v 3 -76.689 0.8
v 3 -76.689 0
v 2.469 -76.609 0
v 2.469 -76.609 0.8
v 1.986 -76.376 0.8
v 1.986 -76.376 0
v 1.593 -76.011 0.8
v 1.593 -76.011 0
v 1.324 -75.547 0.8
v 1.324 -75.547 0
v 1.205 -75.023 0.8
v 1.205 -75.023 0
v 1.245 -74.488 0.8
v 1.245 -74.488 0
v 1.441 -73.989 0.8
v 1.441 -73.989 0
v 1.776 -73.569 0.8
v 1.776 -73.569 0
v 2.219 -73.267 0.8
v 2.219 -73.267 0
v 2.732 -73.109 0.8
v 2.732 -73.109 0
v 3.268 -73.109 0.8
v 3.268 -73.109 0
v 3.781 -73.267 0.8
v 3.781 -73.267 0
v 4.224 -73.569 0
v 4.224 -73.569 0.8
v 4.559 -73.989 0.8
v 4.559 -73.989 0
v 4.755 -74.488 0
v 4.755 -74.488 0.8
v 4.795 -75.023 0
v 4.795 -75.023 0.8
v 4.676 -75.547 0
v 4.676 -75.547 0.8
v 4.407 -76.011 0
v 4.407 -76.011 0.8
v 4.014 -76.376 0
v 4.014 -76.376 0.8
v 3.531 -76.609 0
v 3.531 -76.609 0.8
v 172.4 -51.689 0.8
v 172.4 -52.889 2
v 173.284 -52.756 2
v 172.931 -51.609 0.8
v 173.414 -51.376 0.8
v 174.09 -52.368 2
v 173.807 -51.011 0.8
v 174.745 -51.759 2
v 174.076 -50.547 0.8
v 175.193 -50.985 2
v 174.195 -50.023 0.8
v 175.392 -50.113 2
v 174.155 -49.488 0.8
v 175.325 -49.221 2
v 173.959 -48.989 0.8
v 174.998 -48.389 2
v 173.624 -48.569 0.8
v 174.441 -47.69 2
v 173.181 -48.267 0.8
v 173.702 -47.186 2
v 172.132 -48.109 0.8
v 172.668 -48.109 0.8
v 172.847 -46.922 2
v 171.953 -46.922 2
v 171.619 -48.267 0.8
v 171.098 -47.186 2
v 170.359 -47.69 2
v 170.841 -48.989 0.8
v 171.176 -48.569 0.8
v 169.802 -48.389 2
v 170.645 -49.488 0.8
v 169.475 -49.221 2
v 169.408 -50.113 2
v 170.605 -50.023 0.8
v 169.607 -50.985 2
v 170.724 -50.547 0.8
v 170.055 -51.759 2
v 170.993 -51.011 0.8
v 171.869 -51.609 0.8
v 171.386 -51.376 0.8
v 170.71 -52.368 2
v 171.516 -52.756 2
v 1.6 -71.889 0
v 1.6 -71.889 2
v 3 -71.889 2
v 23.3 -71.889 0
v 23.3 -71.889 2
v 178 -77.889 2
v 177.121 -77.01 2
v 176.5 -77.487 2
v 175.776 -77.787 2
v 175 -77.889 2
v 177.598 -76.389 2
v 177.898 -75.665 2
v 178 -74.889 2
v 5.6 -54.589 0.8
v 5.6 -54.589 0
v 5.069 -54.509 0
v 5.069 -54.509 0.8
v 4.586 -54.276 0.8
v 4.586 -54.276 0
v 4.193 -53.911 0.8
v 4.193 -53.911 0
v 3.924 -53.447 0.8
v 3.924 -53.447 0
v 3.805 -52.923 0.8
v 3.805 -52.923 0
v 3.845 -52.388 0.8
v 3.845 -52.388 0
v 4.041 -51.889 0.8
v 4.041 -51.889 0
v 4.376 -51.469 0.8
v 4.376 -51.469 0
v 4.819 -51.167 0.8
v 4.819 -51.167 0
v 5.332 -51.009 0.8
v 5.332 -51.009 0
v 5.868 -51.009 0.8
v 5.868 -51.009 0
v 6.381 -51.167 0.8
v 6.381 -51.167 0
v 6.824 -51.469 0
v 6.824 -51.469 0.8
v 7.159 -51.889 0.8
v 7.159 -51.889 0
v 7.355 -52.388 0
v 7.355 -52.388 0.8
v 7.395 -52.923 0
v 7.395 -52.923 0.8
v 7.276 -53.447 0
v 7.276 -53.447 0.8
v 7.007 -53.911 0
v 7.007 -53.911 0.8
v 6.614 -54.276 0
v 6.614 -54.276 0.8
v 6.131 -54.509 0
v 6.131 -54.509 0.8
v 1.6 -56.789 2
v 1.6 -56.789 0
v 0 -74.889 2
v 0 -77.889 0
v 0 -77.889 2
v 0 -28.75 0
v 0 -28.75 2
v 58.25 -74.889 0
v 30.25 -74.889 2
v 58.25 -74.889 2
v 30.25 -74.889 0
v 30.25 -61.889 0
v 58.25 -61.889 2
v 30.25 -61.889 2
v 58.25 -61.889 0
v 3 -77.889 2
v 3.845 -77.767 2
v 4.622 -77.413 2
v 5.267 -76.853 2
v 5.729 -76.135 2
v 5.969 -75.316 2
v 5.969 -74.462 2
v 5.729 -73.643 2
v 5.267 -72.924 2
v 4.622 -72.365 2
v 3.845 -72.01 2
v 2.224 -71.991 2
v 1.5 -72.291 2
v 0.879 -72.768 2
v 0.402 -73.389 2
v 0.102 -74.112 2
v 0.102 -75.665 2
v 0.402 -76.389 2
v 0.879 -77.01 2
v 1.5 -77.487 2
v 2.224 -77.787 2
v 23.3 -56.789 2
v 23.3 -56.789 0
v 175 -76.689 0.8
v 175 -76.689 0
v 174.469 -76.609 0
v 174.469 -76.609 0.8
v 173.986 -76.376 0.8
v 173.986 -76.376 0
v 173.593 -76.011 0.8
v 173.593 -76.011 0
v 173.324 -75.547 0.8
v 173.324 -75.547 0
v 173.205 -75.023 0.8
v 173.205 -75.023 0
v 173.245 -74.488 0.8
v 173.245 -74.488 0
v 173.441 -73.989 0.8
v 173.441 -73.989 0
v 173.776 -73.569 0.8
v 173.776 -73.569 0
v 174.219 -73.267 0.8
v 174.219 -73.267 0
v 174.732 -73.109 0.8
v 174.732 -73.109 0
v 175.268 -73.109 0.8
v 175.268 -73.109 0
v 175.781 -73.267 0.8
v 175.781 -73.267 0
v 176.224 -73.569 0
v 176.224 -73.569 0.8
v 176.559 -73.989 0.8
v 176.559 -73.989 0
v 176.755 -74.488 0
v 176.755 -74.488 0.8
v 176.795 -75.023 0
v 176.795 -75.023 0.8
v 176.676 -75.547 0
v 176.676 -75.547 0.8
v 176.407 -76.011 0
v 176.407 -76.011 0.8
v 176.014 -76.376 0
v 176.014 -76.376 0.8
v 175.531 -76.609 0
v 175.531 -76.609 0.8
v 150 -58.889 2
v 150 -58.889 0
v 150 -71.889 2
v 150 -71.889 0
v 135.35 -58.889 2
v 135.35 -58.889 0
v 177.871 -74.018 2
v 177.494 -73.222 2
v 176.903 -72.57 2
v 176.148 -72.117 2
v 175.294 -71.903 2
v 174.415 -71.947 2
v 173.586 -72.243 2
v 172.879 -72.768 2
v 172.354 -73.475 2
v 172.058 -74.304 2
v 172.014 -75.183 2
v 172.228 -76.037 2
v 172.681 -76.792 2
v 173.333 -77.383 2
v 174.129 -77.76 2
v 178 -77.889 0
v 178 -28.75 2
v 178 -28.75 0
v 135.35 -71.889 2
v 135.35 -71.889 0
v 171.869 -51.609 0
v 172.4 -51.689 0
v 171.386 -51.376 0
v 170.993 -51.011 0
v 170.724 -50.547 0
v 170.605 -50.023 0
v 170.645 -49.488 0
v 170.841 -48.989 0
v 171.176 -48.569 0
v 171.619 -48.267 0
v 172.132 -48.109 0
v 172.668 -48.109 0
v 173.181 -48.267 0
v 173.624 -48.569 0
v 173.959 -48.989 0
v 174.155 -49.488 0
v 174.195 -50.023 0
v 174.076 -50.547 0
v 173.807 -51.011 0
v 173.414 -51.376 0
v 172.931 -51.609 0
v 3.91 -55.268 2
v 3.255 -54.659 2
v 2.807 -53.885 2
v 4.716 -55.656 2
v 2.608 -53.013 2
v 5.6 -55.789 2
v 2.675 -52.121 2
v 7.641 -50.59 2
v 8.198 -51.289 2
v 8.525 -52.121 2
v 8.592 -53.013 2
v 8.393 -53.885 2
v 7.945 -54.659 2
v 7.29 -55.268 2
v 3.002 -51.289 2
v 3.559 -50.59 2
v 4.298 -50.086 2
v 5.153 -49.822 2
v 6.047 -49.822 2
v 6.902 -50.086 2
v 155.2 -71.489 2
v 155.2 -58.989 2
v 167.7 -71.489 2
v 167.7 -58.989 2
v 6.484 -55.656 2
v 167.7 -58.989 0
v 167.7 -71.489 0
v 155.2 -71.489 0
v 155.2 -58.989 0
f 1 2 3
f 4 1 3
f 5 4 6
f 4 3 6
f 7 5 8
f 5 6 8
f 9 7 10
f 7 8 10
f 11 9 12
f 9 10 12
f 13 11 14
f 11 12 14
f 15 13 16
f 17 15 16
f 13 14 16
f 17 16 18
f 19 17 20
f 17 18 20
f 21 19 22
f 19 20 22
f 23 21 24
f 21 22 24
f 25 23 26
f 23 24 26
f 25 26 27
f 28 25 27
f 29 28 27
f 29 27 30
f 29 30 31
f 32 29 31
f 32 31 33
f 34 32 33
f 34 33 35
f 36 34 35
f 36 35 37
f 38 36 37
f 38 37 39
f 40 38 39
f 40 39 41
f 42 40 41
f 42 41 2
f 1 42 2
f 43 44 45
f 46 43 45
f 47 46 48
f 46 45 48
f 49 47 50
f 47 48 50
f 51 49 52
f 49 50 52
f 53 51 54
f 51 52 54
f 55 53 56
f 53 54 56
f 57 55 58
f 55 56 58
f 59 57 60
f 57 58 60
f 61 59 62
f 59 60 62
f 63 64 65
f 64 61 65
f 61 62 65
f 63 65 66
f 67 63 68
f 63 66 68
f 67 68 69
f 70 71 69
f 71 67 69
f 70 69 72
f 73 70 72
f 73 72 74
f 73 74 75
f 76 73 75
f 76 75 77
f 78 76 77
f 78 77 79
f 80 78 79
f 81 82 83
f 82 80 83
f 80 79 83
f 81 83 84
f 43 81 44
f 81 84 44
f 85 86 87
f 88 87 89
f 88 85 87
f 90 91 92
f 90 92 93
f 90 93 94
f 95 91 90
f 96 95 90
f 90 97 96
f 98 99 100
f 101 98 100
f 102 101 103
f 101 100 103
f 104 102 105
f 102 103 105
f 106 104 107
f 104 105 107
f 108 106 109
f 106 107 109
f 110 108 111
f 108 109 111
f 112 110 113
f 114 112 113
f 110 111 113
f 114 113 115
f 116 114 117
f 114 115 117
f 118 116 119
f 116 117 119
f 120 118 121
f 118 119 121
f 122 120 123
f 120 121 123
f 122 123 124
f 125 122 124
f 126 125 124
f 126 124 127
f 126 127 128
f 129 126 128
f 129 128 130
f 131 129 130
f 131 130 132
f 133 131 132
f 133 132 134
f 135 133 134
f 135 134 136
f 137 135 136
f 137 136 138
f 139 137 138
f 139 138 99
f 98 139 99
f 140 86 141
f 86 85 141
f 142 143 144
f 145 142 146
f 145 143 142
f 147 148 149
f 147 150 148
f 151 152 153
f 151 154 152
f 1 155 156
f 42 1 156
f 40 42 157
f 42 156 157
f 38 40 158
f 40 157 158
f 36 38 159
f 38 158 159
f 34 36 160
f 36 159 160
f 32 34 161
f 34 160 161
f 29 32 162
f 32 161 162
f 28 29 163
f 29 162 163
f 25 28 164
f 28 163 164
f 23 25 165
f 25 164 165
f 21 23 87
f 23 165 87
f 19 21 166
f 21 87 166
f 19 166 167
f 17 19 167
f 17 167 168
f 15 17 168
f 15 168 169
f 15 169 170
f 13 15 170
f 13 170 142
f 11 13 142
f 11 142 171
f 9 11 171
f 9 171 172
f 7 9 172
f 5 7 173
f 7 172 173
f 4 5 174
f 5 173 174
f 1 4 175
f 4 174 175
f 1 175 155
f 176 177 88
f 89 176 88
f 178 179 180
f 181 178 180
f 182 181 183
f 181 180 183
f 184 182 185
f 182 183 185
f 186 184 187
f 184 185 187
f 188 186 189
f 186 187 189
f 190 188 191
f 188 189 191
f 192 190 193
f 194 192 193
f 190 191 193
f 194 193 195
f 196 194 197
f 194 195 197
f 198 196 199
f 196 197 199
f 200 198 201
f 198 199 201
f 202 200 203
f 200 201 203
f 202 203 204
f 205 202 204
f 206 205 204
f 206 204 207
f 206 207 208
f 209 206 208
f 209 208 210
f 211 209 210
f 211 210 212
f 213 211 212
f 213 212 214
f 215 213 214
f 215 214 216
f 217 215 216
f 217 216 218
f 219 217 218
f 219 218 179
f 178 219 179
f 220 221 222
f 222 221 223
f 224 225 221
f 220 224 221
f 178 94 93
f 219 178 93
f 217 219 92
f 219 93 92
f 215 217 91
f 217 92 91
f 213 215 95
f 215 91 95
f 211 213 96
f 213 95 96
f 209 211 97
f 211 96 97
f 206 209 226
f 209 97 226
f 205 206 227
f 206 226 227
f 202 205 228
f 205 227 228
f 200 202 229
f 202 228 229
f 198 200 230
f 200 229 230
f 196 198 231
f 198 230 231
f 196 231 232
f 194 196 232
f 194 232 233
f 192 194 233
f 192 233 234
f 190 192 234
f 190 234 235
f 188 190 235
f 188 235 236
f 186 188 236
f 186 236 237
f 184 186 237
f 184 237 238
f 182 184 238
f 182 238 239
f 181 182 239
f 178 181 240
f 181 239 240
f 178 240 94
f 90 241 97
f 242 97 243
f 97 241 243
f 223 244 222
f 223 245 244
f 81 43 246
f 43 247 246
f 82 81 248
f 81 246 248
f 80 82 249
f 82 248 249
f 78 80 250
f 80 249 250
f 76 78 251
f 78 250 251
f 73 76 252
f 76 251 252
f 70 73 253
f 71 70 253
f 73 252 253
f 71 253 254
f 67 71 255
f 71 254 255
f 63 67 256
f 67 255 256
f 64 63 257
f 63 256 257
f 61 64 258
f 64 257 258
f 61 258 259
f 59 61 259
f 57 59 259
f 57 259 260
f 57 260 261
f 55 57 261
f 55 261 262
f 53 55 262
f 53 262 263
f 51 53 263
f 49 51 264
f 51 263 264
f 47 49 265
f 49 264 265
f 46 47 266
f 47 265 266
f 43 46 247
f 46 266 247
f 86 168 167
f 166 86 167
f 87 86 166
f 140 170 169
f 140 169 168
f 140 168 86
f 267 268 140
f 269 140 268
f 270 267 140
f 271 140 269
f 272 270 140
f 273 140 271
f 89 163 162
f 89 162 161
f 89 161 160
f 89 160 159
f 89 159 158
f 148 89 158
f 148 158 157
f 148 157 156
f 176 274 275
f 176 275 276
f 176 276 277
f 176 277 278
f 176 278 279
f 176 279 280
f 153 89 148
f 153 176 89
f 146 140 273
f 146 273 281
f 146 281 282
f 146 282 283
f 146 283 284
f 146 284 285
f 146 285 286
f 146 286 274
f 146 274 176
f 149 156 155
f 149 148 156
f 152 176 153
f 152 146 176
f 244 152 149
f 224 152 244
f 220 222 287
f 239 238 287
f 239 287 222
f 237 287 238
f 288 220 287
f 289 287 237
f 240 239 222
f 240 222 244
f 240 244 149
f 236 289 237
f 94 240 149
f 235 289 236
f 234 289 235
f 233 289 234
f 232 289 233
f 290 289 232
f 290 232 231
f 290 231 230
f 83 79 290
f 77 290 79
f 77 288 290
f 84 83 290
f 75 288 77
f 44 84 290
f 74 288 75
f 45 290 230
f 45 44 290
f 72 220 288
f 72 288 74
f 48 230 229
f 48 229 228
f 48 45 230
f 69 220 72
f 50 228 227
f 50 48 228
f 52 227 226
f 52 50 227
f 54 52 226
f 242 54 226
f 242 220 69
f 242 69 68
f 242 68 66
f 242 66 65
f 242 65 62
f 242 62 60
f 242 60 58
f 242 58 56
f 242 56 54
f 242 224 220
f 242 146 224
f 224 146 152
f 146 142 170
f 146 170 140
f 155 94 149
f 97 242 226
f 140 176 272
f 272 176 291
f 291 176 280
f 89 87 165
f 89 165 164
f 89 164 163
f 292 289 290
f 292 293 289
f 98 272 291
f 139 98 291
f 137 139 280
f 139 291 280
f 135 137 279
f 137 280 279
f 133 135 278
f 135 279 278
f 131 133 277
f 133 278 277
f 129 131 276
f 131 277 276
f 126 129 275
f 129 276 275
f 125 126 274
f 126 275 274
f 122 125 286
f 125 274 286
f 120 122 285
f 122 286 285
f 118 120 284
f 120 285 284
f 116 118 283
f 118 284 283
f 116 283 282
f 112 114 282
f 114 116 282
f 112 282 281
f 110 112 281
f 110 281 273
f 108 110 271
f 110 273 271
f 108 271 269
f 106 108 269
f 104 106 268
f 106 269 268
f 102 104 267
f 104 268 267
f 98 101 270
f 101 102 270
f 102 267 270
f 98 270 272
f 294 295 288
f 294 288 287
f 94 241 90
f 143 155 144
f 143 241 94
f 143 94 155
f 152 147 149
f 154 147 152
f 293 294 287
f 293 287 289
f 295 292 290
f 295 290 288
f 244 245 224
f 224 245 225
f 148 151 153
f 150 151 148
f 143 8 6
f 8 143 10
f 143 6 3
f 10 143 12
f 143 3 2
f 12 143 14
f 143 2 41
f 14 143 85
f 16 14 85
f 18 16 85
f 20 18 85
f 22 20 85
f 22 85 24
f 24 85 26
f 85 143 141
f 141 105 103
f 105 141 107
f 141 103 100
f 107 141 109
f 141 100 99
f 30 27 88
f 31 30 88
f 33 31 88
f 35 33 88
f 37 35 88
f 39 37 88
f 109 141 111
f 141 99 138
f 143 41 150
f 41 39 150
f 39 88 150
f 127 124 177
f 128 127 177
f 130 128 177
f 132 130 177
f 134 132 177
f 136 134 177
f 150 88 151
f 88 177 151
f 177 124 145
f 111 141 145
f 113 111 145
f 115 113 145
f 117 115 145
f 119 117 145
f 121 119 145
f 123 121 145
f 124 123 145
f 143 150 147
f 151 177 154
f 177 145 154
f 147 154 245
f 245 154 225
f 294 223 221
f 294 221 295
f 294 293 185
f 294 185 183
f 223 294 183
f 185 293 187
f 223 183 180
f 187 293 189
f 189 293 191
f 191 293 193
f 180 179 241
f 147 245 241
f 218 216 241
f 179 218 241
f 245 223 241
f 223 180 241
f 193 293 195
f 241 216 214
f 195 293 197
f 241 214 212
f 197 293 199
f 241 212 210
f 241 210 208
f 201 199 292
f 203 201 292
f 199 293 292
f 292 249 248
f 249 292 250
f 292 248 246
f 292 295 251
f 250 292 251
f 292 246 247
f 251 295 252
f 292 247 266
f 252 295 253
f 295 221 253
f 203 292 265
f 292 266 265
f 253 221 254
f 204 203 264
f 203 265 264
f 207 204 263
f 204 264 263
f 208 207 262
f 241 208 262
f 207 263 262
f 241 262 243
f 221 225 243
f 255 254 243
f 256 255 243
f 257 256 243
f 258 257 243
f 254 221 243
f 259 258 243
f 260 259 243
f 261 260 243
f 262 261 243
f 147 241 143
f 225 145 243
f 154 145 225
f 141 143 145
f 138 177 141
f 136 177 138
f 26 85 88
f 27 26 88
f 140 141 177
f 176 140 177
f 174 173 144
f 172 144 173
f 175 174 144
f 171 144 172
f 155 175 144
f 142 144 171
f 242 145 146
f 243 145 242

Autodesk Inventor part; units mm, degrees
ref_plane "YZ Plane" through (0, 0, 0) normal (1, 0, 0) x (0, 1, 0)
ref_plane "XZ Plane" through (0, 0, 0) normal (0, 1, 0) x (-1, 0, 0)
ref_plane "XY Plane" through (0, 0, 0) normal (0, 0, 1) x (1, 0, 0)
ref_plane "Work Plane1" through (0, 0, 0) normal (0, 0, 1) x (1, 0, 0)
sketch "Sketch1" plane through (0, 0, 0) normal (0, 0, 1) x (1, 0, 0)
  circle A0 centre (118.7, -21.5445) radius 2.5 projected
  circle A1 centre (113.95, -8.8843) radius 2.5 projected
  circle A2 centre (64.05, -19.8657) radius 2.5 projected
  circle A3 centre (59.3, -7.2055) radius 2.5 projected
  circle A4 centre (64.05, -8.8843) radius 2.5 projected
  circle A5 centre (59.3, -21.5445) radius 2.5 projected
  circle A6 centre (118.7, -7.2055) radius 2.5 projected
  circle A7 centre (113.95, -19.8657) radius 2.5 projected
  line L0 (84.5, 12.4325) -> (84.5, -11.5675) projected
  line L1 (84.5, -11.5675) -> (72.5, -11.5675) projected
  line L2 (72.5, -11.5675) -> (72.5, 4.5875) projected
  circle A8 centre (69.5, 4.5875) radius 3 projected
  line L3 (72.5, 4.5875) -> (72.5, 12.4325) projected
  line L4 (72.5, 12.4325) -> (84.5, 12.4325) projected
  arc A9 (105.5, 4.2836) -> (105.5, 4.8914) centre (108.4846, 4.5875) ccw projected
  line L5 (105.5, 4.2836) -> (105.5, -11.5675) projected
  line L6 (105.5, -11.5675) -> (93.5, -11.5675) projected
  line L7 (93.5, -11.5675) -> (93.5, 12.4325) projected
  line L8 (93.5, 12.4325) -> (105.5, 12.4325) projected
  line L9 (105.5, 12.4325) -> (105.5, 4.8914) projected
  circle A10 centre (108.4462, 27.5) radius 3 projected
  circle A11 centre (69.5, 27.5) radius 3 projected
  circle A12 centre (89, 0.9661) radius 3 projected
  circle A13 centre (89, 29.5) radius 3 projected
  arc A14 (175, 0) -> (178, -3) centre (175, -3) ccw projected
  line L10 (175, 0) -> (112.5, 0) projected
  line L11 (112.5, 0) -> (112.5, 55) projected
  line L12 (112.5, 55) -> (65.5, 55) projected
  line L13 (65.5, 55) -> (65.5, 0) projected
  line L14 (65.5, 0) -> (3, 0) projected
  arc A15 (0, -3) -> (3, 0) centre (3, -3) ccw projected
  line L15 (0, -3) -> (0, -25.75) projected
  arc A16 (3, -28.75) -> (0, -25.75) centre (3, -25.75) ccw projected
  line L16 (3, -28.75) -> (175, -28.75) projected
  arc A17 (178, -25.75) -> (175, -28.75) centre (175, -25.75) ccw projected
  line L17 (178, -25.75) -> (178, -3) projected
  circle A18 centre (3, -25.75) radius 2.3 projected
  circle A19 centre (3, -3) radius 2.3 projected
  circle A20 centre (3, -74.8889) radius 2.3 projected
  line L18 (0, 0) -> (6, 0) projected
  line L19 (0, -77.8889) -> (0, 0) projected
  line L20 (0, -77.8889) -> (6, -77.8889) projected
  line L21 (6, -71.8889) -> (6, -77.8889) projected
  line L22 (6, -71.8889) -> (1.6, -71.8889) projected
  line L23 (1.6, -71.8889) -> (1.6, -56.7889) projected
  line L24 (1.6, -56.7889) -> (9.6, -56.7889) projected
  line L25 (9.6, -44.7889) -> (9.6, -56.7889) projected
  line L26 (3, -44.7889) -> (9.6, -44.7889) projected
  line L27 (3, -28.75) -> (3, -44.7889) projected
  line L28 (3, -28.75) -> (6, -28.75) projected
  line L29 (6, -28.75) -> (6, -22.75) projected
  line L30 (6, -22.75) -> (3, -22.75) projected
  line L31 (3, -6) -> (3, -22.75) projected
  line L32 (3, -6) -> (6, -6) projected
  line L33 (6, -6) -> (6, 0) projected
  circle A21 centre (5.6, -52.7889) radius 2.6 projected
  circle A22 centre (175, -3) radius 2.3 projected
  circle A23 centre (175, -25.75) radius 2.3 projected
  line L34 (175, -28.75) -> (175, -41.8889) projected
  line L35 (168.4, -41.8889) -> (175, -41.8889) projected
  line L36 (168.4, -53.8889) -> (168.4, -41.8889) projected
  line L37 (175, -53.8889) -> (168.4, -53.8889) projected
  line L38 (175, -53.8889) -> (175, -71.8889) projected
  line L39 (175, -71.8889) -> (172, -71.8889) projected
  line L40 (172, -71.8889) -> (172, -77.8889) projected
  line L41 (178, -77.8889) -> (172, -77.8889) projected
  line L42 (178, -77.8889) -> (178, 0) projected
  line L43 (178, 0) -> (172, 0) projected
  line L44 (172, 0) -> (172, -6) projected
  line L45 (172, -6) -> (175, -6) projected
  line L46 (175, -6) -> (175, -22.75) projected
  line L47 (175, -22.75) -> (172, -22.75) projected
  line L48 (172, -22.75) -> (172, -28.75) projected
  line L49 (172, -28.75) -> (175, -28.75) projected
  circle A24 centre (175, -74.8889) radius 2.3 projected
  circle A25 centre (172.4, -49.8889) radius 2.6 projected
  line L50 (156.2, -70.4889) -> (156.2, -59.9889) projected
  line L51 (166.7, -59.9889) -> (156.2, -59.9889) projected
  line L52 (166.7, -59.9889) -> (166.7, -70.4889) projected
  line L53 (156.2, -70.4889) -> (166.7, -70.4889) projected
  line L54 (149, -59.8889) -> (149, -70.8889) projected
  line L55 (149, -70.8889) -> (136.35, -70.8889) projected
  line L56 (136.35, -70.8889) -> (136.35, -59.8889) projected
  line L57 (136.35, -59.8889) -> (149, -59.8889) projected
  line L58 (135, -53.8889) -> (135, -71.8889) projected
  line L59 (135, -71.8889) -> (175, -71.8889) projected
  line L60 (175, -71.8889) -> (175, -53.8889) projected
  line L61 (175, -53.8889) -> (135, -53.8889) projected
  circle A26 centre (137.85, -56.7389) radius 1.5 projected
  circle A27 centre (172.15, -56.7389) radius 1.5 projected
  line L62 (31.25, -62.8889) -> (31.25, -73.8889) projected
  line L63 (31.25, -73.8889) -> (57.25, -73.8889) projected
  line L64 (57.25, -73.8889) -> (57.25, -62.8889) projected
  line L65 (57.25, -62.8889) -> (31.25, -62.8889) projected
  line L66 (9.6, -56.7889) -> (23.3, -56.7889) projected
  line L67 (23.3, -56.7889) -> (23.3, -59.8889) projected
  line L68 (23.3, -59.8889) -> (23.3, -65.1889) projected
  line L69 (3, -71.8889) -> (23.3, -71.8889) projected
  line L70 (23.3, -61.8889) -> (23.3, -74.8889) projected
  line L71 (30.25, -61.8889) -> (30.25, -74.8889)
  line L72 (30.25, -74.8889) -> (58.25, -74.8889)
  line L73 (58.25, -74.8889) -> (58.25, -61.8889)
  line L74 (58.25, -61.8889) -> (30.25, -61.8889)
  line L75 (150, -58.8889) -> (150, -71.8889)
  line L76 (150, -71.8889) -> (135.35, -71.8889)
  line L77 (135.35, -71.8889) -> (135.35, -58.8889)
  line L78 (135.35, -58.8889) -> (150, -58.8889)
  line L79 (155.2, -58.9889) -> (155.2, -71.4889)
  line L80 (155.2, -71.4889) -> (167.7, -71.4889)
  line L81 (167.7, -71.4889) -> (167.7, -58.9889)
  line L82 (167.7, -58.9889) -> (155.2, -58.9889)
  line L83 (0, -28.75) -> (178, -28.75)
  line L84 (178, -28.75) -> (178, -77.8889)
  line L85 (178, -77.8889) -> (0, -77.8889)
  line L86 (0, -77.8889) -> (0, -28.75)
  point P0 (3, -28.75)
  point P1 (175, -28.75)
  point P2 (135.35, -71.8889)
  dimension "d0" = 1
  dimension "d1" = 1
  dimension "d2" = 1
extrude "Extrusion1" add sketch "Sketch1" along normal blind 2 contours L42 L41 L40 L39 L38 L37 L36 L35 L34 L83 | L34 L35 L36 L61 L58 L59 L40 L85 L21 L69 L70 L68 L67 L66 L25 L26 L27 L16 | L27 L26 L25 L24 L23 L22 L21 L20 L19 L83 | L59 L75 L78 L77 L58 L61 L37 L38 L39 | A20 | A21 | A24 | A25 | A26 | A27
sketch "Sketch2" plane through (0, 0, 2) normal (0, 0, 1) x (1, 0, 0)
  circle A0 centre (3, -25.75) radius 2.3 projected
  circle A1 centre (3, -3) radius 2.3 projected
  circle A2 centre (3, -74.8889) radius 2.3 projected
  line L0 (0, 0) -> (6, 0) projected
  line L1 (0, -77.8889) -> (0, 0) projected
  line L2 (0, -77.8889) -> (6, -77.8889) projected
  line L3 (6, -71.8889) -> (6, -77.8889) projected
  line L4 (6, -71.8889) -> (1.6, -71.8889) projected
  line L5 (1.6, -71.8889) -> (1.6, -56.7889) projected
  line L6 (1.6, -56.7889) -> (9.6, -56.7889) projected
  line L7 (9.6, -44.7889) -> (9.6, -56.7889) projected
  line L8 (3, -44.7889) -> (9.6, -44.7889) projected
  line L9 (3, -28.75) -> (3, -44.7889) projected
  line L10 (3, -28.75) -> (6, -28.75) projected
  line L11 (6, -28.75) -> (6, -22.75) projected
  line L12 (6, -22.75) -> (3, -22.75) projected
  line L13 (3, -6) -> (3, -22.75) projected
  line L14 (3, -6) -> (6, -6) projected
  line L15 (6, -6) -> (6, 0) projected
  circle A3 centre (5.6, -52.7889) radius 2.6 projected
  circle A4 centre (172.4, -49.8889) radius 2.6 projected
  circle A5 centre (175, -3) radius 2.3 projected
  circle A6 centre (175, -25.75) radius 2.3 projected
  line L16 (175, -28.75) -> (175, -41.8889) projected
  line L17 (168.4, -41.8889) -> (175, -41.8889) projected
  line L18 (168.4, -53.8889) -> (168.4, -41.8889) projected
  line L19 (175, -53.8889) -> (168.4, -53.8889) projected
  line L20 (175, -53.8889) -> (175, -71.8889) projected
  line L21 (175, -71.8889) -> (172, -71.8889) projected
  line L22 (172, -71.8889) -> (172, -77.8889) projected
  line L23 (178, -77.8889) -> (172, -77.8889) projected
  line L24 (178, -77.8889) -> (178, 0) projected
  line L25 (178, 0) -> (172, 0) projected
  line L26 (172, 0) -> (172, -6) projected
  line L27 (172, -6) -> (175, -6) projected
  line L28 (175, -6) -> (175, -22.75) projected
  line L29 (175, -22.75) -> (172, -22.75) projected
  line L30 (172, -22.75) -> (172, -28.75) projected
  line L31 (172, -28.75) -> (175, -28.75) projected
  circle A7 centre (175, -74.8889) radius 2.3 projected
  circle A8 centre (172.4, -49.8889) radius 2.6 projected
hole "Hole1" at (5.6, -52.7889, 2) at (3, -74.8889, 2) at (175, -74.8889, 2) at (172.4, -49.8889, 2) direction (0, 0, -1) diameter 3.6 end through all countersink diameter 6 countersink angle 90 clearance for "Countersunk Flat Head Screw ISO 2009/7046" size "M3" standard "ISO"
properties part number "ceil_front"
